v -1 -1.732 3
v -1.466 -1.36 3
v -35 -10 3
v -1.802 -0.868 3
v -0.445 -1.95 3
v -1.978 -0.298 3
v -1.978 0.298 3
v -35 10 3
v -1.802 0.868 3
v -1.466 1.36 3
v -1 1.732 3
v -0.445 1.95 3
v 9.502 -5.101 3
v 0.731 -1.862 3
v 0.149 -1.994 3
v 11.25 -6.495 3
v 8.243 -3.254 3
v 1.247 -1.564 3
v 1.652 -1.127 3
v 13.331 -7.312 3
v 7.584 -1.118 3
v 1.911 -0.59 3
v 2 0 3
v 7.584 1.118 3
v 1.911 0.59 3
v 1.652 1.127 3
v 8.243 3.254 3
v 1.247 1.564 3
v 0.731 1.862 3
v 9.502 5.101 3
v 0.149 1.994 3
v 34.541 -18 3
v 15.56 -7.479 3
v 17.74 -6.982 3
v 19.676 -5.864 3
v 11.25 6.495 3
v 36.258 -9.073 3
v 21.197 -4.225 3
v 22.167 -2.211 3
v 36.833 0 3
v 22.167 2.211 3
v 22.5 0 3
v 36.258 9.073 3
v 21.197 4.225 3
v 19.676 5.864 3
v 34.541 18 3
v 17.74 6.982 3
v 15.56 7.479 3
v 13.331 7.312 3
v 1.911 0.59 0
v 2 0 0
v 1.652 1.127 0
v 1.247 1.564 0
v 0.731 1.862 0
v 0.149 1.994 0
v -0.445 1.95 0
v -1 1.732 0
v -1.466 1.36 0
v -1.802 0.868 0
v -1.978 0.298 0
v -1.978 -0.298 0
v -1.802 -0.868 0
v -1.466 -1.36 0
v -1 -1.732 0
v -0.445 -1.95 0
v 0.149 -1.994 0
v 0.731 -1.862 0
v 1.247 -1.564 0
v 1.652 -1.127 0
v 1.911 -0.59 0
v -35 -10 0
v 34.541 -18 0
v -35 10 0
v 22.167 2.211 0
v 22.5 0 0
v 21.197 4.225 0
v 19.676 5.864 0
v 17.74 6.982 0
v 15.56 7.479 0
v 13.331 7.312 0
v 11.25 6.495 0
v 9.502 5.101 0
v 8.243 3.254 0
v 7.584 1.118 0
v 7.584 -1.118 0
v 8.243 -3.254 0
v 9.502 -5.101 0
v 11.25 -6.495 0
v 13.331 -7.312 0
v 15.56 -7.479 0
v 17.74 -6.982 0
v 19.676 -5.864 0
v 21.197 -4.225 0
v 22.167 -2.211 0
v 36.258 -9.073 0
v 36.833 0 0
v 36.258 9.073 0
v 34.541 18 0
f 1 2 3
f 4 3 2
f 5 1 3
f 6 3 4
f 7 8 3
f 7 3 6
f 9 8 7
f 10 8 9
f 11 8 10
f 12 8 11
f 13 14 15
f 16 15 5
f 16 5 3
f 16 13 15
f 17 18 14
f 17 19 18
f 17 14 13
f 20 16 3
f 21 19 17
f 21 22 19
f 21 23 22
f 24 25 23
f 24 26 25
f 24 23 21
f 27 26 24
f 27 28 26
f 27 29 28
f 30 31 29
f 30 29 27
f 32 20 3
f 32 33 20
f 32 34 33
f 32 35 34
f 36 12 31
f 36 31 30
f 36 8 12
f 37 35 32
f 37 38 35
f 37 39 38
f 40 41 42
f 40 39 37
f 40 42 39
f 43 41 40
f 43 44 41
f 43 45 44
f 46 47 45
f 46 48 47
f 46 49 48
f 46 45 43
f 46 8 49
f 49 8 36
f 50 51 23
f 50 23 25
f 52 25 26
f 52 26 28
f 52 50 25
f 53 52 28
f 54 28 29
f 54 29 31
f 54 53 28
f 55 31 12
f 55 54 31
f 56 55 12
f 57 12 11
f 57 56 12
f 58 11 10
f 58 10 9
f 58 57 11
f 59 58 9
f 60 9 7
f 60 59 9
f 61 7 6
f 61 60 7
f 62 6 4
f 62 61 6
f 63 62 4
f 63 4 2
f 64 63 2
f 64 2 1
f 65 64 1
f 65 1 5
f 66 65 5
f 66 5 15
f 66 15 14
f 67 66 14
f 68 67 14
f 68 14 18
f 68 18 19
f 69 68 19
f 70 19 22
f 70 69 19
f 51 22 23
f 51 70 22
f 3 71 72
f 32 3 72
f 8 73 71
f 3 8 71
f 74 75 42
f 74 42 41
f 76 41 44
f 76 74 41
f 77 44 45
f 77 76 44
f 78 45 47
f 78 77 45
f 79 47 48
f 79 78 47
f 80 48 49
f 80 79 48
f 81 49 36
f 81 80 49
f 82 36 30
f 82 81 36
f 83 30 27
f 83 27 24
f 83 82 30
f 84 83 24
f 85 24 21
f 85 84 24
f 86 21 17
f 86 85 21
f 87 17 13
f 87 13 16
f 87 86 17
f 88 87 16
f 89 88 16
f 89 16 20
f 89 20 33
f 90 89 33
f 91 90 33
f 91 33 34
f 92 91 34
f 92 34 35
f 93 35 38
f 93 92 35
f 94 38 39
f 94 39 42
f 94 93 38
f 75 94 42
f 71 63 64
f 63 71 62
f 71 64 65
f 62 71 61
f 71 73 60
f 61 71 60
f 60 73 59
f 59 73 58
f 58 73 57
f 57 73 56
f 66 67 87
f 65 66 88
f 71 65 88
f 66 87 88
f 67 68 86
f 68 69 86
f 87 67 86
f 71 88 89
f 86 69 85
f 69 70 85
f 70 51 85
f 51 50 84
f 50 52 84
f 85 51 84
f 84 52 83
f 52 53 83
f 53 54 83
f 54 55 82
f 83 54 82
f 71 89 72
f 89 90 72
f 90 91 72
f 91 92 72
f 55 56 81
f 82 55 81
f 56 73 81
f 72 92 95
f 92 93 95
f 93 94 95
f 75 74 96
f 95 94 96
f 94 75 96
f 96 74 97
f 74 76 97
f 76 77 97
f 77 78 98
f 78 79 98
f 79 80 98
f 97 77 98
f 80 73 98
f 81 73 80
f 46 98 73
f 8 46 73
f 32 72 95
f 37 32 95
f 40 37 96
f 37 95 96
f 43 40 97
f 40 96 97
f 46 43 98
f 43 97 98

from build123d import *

# Parameters (mm, degrees)
F0_R     = 2
F0_R_2   = 7.5
F1_DEPTH = 3


with BuildPart() as f1:
    # F0 (on Top) → F1 (new body)
    with BuildSketch(Plane.XY):
        with BuildLine():
            ThreePointArc((34.541355, -18), (36.83314, 0), (34.541355, 18))
            Line((34.541355, 18), (-35, 10))
            Line((-35, 10), (-35, -10))
            Line((-35, -10), (34.541355, -18))
        make_face()
        Circle(F0_R, mode=Mode.SUBTRACT)
        with Locations((15, 0)):
            Circle(F0_R_2, mode=Mode.SUBTRACT)
    extrude(amount=F1_DEPTH)


solid = f1.part
